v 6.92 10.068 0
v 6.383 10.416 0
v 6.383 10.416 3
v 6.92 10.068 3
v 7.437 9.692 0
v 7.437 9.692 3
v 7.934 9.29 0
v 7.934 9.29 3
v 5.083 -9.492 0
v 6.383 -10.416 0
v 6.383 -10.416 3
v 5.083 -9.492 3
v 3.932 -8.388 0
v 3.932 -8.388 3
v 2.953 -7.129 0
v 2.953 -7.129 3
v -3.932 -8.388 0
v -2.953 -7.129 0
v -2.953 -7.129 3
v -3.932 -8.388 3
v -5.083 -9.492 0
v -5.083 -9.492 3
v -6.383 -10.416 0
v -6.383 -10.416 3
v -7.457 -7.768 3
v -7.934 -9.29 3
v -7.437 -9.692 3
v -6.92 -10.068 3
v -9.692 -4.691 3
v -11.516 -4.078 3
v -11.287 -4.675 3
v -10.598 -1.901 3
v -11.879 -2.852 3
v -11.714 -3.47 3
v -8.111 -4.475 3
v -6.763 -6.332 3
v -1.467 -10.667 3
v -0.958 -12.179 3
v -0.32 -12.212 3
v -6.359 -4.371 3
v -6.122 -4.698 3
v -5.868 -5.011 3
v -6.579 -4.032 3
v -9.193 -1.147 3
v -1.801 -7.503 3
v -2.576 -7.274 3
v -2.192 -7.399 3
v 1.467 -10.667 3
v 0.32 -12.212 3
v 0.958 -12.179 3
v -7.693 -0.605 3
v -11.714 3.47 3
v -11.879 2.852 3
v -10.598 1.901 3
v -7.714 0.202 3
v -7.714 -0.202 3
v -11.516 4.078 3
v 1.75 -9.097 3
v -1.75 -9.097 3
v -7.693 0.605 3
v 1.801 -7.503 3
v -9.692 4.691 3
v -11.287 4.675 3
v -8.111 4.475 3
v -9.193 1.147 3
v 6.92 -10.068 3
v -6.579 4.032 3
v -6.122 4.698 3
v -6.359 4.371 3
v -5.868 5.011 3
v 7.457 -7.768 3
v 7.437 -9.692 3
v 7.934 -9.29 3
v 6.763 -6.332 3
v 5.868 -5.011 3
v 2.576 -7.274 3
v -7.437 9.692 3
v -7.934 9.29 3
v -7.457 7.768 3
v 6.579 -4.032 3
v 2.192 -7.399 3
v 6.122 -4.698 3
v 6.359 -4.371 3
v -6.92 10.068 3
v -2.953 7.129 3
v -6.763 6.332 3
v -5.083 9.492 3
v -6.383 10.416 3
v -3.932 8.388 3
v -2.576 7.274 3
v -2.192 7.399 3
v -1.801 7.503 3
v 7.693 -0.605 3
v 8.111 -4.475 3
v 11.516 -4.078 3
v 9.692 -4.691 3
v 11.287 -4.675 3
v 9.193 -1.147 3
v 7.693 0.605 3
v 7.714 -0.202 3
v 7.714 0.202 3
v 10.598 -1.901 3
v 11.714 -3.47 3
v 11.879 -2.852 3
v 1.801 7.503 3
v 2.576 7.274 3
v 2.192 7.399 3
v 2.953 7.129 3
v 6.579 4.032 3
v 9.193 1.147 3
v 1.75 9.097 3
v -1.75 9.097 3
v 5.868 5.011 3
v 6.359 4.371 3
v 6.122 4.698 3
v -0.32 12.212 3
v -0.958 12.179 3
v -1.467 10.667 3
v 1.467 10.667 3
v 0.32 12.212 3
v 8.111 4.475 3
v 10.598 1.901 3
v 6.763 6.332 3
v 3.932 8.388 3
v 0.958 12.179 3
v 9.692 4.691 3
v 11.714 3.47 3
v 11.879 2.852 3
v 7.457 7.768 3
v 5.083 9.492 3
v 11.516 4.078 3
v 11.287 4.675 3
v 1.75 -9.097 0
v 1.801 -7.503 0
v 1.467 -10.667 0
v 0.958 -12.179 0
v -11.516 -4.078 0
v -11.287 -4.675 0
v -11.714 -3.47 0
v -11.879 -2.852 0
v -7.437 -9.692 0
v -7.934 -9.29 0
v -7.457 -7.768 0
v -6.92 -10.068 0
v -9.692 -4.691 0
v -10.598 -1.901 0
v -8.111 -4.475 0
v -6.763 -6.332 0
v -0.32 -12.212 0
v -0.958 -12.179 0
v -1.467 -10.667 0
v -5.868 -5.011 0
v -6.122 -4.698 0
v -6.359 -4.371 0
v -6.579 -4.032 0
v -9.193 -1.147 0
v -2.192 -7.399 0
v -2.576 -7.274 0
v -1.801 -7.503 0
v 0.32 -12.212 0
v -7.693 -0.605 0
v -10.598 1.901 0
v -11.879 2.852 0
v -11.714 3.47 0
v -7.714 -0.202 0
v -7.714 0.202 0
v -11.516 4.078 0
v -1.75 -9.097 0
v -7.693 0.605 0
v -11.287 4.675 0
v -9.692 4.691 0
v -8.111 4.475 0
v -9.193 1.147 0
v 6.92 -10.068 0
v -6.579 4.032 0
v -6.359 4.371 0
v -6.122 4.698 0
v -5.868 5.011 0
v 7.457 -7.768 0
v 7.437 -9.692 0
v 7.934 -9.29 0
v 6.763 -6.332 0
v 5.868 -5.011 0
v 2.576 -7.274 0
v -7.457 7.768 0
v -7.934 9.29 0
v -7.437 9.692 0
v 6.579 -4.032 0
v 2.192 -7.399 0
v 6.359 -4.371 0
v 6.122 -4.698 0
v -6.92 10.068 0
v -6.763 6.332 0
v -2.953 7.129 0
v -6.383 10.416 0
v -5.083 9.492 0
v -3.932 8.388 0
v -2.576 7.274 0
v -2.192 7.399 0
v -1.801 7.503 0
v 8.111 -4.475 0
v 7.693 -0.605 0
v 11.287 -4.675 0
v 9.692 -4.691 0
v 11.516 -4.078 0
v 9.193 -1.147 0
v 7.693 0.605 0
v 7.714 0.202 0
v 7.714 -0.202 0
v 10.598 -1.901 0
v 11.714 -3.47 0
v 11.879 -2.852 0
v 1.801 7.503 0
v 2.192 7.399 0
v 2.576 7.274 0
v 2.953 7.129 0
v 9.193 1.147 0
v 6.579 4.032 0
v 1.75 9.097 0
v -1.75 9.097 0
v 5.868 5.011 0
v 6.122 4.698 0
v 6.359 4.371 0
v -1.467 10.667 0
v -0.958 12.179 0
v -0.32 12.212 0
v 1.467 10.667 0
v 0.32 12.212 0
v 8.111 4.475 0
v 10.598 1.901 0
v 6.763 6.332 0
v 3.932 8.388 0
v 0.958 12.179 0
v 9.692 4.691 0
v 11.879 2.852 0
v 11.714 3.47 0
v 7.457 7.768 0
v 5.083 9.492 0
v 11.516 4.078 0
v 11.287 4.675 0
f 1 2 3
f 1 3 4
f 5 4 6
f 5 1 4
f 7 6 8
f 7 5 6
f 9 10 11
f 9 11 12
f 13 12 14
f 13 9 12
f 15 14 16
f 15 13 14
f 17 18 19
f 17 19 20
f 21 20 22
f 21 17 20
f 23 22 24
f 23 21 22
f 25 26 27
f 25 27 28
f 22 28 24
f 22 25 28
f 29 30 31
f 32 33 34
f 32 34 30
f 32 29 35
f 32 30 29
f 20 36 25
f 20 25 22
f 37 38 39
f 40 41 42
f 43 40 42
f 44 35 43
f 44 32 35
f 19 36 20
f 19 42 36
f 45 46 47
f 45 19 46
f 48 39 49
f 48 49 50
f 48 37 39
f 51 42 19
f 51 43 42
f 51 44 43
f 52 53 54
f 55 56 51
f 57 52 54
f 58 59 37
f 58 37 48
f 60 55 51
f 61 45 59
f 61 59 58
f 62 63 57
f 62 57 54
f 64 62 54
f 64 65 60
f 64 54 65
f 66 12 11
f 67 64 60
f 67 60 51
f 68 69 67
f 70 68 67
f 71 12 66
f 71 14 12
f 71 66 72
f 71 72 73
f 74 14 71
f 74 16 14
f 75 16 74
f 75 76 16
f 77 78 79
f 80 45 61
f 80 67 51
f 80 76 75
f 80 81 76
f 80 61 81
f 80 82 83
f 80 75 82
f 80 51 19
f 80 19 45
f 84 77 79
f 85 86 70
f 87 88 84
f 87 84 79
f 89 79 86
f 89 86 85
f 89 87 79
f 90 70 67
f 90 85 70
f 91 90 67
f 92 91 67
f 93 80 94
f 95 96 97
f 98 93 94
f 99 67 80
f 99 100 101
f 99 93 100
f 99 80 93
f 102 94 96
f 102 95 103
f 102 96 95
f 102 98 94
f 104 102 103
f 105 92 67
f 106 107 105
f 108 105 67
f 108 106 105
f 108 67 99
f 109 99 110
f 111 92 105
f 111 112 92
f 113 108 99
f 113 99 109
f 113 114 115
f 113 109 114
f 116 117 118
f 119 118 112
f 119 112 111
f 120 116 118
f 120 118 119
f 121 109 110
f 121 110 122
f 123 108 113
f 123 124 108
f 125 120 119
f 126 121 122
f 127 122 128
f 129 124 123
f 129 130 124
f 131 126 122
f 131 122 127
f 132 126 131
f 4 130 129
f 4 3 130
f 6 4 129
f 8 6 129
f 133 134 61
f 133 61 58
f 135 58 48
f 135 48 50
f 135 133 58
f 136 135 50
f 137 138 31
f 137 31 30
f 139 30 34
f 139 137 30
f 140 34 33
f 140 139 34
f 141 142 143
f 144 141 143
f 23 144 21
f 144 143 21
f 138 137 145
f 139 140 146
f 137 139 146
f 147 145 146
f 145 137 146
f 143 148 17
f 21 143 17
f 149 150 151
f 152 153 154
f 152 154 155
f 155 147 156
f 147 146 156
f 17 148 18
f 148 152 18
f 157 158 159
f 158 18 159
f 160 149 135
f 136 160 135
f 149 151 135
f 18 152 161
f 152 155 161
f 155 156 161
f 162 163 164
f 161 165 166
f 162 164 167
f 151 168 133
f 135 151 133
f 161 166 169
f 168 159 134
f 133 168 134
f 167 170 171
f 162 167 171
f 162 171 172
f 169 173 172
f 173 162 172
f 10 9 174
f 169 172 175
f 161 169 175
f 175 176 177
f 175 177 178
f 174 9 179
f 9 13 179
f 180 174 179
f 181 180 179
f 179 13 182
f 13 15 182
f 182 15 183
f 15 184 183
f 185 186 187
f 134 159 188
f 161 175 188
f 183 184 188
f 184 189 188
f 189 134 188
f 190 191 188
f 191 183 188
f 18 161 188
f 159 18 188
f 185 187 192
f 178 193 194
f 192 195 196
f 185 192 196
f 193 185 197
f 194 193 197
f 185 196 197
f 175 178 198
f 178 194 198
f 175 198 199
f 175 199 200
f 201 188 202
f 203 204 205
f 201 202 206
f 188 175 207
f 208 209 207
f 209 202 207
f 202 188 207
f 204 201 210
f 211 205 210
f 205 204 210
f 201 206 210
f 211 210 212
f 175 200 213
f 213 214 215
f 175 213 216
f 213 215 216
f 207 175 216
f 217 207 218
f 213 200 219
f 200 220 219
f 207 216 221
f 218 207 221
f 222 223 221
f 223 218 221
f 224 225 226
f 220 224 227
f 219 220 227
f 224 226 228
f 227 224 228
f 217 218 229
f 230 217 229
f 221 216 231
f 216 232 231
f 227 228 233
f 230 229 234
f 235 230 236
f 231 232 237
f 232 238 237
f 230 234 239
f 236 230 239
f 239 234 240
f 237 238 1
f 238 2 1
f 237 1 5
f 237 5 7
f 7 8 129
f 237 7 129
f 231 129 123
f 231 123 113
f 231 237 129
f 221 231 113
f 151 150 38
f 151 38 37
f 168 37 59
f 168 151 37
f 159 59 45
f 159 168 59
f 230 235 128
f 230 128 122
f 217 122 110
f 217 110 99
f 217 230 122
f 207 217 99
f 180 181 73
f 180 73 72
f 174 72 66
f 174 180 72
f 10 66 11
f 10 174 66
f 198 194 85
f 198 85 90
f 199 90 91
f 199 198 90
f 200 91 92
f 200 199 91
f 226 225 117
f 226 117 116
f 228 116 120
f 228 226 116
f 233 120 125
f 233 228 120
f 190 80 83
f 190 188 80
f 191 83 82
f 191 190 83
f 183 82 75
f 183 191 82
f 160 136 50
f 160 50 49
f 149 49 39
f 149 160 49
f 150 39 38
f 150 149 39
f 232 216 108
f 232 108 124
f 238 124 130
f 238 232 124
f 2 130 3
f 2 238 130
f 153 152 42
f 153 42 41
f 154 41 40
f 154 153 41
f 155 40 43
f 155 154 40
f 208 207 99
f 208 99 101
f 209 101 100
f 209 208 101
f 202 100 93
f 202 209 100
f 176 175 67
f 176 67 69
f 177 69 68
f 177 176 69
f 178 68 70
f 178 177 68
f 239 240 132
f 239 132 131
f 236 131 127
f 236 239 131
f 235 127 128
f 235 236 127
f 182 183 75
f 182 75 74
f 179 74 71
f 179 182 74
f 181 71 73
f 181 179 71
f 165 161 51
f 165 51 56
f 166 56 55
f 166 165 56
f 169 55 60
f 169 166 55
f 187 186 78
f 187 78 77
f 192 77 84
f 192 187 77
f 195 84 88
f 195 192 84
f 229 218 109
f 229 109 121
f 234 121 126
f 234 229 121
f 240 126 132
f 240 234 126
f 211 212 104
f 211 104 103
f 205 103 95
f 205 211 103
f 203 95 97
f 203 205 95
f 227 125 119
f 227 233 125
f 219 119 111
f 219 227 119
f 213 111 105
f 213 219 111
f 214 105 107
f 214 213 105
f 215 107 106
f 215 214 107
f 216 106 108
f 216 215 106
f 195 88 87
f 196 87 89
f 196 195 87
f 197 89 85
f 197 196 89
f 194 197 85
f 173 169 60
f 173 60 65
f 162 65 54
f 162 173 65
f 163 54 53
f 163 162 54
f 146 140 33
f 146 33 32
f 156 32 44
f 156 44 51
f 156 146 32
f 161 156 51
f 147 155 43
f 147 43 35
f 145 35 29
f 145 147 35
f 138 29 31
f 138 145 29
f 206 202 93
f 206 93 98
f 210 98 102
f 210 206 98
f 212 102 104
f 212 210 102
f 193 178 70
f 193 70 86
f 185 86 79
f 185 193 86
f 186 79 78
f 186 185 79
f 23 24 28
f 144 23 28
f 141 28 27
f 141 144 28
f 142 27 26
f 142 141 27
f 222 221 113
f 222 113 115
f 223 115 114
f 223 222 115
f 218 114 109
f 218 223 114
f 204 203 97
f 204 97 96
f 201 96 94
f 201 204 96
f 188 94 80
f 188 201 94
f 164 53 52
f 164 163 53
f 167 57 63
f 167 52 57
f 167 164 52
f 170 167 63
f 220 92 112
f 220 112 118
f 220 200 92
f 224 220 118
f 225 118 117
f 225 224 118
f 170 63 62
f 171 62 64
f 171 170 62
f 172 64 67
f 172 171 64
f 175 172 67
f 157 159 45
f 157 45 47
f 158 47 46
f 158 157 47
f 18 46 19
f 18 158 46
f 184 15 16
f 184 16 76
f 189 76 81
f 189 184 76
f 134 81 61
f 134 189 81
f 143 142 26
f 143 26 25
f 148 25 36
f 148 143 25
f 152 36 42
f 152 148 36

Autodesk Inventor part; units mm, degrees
sketch "Sketch1" plane through (0, 0, 0) normal (0, 0, 1) x (1, 0, 0)
  circle A0 centre (0, 0) radius 12.2166
  dimension "d0" = 24.4331
extrude "Extrusion1" add sketch "Sketch1" along normal blind 3
ref_plane "Work Plane2" through (0, 0, 1.5) normal (0, 0, 1) x (1, 0, 0)
sketch "Sketch2" plane through (0, 0, 0) normal (0, 0, -1) x (-1, 0, 0)
  circle A0 centre (0, 0) radius 12.2166 projected
  circle A1 centre (0, 0) radius 10
  dimension "d3" = 20
surface extrude "Средний диаметр" sketch "Sketch2" against normal through all shown no curves A1
ref_plane "Work Plane8" through (0, 0, 0) normal (0.9510565, 0.309017, 0) x (0, 0, 1)
ref_plane "Work Plane9" through (0, 0, 0) normal (1, 0, 0) x (0, 1, 0)
spur gear teeth "Цилиндрическое зубчатое зацепление" teeth 10 pitch diameter 20 tip diameter 24.4331 root diameter 15.4331 face width 3 start plane through (0, 0, 0) normal (0, 0, -1) x (-1, 0, 0)
equation "\"d0\" = da_da"
equation "\"d1\" = da_b"
equation "\"d3\" = da_d"
equation "\"da_da\" = 24.433119"
equation "\"da_b\" = 3"
equation "\"da_d\" = 20"
properties part number "Цилиндрическое зубчатое зацепление1" material "Steel"
